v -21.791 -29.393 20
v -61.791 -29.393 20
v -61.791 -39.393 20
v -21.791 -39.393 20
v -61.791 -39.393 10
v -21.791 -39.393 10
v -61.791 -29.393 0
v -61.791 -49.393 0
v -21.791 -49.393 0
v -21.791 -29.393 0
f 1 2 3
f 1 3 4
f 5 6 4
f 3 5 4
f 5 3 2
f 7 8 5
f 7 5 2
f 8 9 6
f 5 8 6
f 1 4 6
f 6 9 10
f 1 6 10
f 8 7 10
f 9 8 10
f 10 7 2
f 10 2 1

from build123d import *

# Parameters (mm, degrees)
F0_W     = 40
F0_H     = 20
F1_DEPTH = 20
F3_DEPTH = 40.001


with BuildPart() as f1:
    # F0 (on Top) → F1 (new body)
    with BuildSketch(Plane.XY):
        with Locations((-41.790509, -39.392859)):
            Rectangle(F0_W, F0_H)
    extrude(amount=F1_DEPTH)

    # F2 (on face) → F3 (cut, through all)
    with BuildSketch(Plane.YZ.offset(-21.790509)):
        Polygon((-39.392859, 10), (-39.392859, 20), (-49.392859, 20), (-49.392859, 0), align=None)
    extrude(amount=-F3_DEPTH, mode=Mode.SUBTRACT)


solid = f1.part
